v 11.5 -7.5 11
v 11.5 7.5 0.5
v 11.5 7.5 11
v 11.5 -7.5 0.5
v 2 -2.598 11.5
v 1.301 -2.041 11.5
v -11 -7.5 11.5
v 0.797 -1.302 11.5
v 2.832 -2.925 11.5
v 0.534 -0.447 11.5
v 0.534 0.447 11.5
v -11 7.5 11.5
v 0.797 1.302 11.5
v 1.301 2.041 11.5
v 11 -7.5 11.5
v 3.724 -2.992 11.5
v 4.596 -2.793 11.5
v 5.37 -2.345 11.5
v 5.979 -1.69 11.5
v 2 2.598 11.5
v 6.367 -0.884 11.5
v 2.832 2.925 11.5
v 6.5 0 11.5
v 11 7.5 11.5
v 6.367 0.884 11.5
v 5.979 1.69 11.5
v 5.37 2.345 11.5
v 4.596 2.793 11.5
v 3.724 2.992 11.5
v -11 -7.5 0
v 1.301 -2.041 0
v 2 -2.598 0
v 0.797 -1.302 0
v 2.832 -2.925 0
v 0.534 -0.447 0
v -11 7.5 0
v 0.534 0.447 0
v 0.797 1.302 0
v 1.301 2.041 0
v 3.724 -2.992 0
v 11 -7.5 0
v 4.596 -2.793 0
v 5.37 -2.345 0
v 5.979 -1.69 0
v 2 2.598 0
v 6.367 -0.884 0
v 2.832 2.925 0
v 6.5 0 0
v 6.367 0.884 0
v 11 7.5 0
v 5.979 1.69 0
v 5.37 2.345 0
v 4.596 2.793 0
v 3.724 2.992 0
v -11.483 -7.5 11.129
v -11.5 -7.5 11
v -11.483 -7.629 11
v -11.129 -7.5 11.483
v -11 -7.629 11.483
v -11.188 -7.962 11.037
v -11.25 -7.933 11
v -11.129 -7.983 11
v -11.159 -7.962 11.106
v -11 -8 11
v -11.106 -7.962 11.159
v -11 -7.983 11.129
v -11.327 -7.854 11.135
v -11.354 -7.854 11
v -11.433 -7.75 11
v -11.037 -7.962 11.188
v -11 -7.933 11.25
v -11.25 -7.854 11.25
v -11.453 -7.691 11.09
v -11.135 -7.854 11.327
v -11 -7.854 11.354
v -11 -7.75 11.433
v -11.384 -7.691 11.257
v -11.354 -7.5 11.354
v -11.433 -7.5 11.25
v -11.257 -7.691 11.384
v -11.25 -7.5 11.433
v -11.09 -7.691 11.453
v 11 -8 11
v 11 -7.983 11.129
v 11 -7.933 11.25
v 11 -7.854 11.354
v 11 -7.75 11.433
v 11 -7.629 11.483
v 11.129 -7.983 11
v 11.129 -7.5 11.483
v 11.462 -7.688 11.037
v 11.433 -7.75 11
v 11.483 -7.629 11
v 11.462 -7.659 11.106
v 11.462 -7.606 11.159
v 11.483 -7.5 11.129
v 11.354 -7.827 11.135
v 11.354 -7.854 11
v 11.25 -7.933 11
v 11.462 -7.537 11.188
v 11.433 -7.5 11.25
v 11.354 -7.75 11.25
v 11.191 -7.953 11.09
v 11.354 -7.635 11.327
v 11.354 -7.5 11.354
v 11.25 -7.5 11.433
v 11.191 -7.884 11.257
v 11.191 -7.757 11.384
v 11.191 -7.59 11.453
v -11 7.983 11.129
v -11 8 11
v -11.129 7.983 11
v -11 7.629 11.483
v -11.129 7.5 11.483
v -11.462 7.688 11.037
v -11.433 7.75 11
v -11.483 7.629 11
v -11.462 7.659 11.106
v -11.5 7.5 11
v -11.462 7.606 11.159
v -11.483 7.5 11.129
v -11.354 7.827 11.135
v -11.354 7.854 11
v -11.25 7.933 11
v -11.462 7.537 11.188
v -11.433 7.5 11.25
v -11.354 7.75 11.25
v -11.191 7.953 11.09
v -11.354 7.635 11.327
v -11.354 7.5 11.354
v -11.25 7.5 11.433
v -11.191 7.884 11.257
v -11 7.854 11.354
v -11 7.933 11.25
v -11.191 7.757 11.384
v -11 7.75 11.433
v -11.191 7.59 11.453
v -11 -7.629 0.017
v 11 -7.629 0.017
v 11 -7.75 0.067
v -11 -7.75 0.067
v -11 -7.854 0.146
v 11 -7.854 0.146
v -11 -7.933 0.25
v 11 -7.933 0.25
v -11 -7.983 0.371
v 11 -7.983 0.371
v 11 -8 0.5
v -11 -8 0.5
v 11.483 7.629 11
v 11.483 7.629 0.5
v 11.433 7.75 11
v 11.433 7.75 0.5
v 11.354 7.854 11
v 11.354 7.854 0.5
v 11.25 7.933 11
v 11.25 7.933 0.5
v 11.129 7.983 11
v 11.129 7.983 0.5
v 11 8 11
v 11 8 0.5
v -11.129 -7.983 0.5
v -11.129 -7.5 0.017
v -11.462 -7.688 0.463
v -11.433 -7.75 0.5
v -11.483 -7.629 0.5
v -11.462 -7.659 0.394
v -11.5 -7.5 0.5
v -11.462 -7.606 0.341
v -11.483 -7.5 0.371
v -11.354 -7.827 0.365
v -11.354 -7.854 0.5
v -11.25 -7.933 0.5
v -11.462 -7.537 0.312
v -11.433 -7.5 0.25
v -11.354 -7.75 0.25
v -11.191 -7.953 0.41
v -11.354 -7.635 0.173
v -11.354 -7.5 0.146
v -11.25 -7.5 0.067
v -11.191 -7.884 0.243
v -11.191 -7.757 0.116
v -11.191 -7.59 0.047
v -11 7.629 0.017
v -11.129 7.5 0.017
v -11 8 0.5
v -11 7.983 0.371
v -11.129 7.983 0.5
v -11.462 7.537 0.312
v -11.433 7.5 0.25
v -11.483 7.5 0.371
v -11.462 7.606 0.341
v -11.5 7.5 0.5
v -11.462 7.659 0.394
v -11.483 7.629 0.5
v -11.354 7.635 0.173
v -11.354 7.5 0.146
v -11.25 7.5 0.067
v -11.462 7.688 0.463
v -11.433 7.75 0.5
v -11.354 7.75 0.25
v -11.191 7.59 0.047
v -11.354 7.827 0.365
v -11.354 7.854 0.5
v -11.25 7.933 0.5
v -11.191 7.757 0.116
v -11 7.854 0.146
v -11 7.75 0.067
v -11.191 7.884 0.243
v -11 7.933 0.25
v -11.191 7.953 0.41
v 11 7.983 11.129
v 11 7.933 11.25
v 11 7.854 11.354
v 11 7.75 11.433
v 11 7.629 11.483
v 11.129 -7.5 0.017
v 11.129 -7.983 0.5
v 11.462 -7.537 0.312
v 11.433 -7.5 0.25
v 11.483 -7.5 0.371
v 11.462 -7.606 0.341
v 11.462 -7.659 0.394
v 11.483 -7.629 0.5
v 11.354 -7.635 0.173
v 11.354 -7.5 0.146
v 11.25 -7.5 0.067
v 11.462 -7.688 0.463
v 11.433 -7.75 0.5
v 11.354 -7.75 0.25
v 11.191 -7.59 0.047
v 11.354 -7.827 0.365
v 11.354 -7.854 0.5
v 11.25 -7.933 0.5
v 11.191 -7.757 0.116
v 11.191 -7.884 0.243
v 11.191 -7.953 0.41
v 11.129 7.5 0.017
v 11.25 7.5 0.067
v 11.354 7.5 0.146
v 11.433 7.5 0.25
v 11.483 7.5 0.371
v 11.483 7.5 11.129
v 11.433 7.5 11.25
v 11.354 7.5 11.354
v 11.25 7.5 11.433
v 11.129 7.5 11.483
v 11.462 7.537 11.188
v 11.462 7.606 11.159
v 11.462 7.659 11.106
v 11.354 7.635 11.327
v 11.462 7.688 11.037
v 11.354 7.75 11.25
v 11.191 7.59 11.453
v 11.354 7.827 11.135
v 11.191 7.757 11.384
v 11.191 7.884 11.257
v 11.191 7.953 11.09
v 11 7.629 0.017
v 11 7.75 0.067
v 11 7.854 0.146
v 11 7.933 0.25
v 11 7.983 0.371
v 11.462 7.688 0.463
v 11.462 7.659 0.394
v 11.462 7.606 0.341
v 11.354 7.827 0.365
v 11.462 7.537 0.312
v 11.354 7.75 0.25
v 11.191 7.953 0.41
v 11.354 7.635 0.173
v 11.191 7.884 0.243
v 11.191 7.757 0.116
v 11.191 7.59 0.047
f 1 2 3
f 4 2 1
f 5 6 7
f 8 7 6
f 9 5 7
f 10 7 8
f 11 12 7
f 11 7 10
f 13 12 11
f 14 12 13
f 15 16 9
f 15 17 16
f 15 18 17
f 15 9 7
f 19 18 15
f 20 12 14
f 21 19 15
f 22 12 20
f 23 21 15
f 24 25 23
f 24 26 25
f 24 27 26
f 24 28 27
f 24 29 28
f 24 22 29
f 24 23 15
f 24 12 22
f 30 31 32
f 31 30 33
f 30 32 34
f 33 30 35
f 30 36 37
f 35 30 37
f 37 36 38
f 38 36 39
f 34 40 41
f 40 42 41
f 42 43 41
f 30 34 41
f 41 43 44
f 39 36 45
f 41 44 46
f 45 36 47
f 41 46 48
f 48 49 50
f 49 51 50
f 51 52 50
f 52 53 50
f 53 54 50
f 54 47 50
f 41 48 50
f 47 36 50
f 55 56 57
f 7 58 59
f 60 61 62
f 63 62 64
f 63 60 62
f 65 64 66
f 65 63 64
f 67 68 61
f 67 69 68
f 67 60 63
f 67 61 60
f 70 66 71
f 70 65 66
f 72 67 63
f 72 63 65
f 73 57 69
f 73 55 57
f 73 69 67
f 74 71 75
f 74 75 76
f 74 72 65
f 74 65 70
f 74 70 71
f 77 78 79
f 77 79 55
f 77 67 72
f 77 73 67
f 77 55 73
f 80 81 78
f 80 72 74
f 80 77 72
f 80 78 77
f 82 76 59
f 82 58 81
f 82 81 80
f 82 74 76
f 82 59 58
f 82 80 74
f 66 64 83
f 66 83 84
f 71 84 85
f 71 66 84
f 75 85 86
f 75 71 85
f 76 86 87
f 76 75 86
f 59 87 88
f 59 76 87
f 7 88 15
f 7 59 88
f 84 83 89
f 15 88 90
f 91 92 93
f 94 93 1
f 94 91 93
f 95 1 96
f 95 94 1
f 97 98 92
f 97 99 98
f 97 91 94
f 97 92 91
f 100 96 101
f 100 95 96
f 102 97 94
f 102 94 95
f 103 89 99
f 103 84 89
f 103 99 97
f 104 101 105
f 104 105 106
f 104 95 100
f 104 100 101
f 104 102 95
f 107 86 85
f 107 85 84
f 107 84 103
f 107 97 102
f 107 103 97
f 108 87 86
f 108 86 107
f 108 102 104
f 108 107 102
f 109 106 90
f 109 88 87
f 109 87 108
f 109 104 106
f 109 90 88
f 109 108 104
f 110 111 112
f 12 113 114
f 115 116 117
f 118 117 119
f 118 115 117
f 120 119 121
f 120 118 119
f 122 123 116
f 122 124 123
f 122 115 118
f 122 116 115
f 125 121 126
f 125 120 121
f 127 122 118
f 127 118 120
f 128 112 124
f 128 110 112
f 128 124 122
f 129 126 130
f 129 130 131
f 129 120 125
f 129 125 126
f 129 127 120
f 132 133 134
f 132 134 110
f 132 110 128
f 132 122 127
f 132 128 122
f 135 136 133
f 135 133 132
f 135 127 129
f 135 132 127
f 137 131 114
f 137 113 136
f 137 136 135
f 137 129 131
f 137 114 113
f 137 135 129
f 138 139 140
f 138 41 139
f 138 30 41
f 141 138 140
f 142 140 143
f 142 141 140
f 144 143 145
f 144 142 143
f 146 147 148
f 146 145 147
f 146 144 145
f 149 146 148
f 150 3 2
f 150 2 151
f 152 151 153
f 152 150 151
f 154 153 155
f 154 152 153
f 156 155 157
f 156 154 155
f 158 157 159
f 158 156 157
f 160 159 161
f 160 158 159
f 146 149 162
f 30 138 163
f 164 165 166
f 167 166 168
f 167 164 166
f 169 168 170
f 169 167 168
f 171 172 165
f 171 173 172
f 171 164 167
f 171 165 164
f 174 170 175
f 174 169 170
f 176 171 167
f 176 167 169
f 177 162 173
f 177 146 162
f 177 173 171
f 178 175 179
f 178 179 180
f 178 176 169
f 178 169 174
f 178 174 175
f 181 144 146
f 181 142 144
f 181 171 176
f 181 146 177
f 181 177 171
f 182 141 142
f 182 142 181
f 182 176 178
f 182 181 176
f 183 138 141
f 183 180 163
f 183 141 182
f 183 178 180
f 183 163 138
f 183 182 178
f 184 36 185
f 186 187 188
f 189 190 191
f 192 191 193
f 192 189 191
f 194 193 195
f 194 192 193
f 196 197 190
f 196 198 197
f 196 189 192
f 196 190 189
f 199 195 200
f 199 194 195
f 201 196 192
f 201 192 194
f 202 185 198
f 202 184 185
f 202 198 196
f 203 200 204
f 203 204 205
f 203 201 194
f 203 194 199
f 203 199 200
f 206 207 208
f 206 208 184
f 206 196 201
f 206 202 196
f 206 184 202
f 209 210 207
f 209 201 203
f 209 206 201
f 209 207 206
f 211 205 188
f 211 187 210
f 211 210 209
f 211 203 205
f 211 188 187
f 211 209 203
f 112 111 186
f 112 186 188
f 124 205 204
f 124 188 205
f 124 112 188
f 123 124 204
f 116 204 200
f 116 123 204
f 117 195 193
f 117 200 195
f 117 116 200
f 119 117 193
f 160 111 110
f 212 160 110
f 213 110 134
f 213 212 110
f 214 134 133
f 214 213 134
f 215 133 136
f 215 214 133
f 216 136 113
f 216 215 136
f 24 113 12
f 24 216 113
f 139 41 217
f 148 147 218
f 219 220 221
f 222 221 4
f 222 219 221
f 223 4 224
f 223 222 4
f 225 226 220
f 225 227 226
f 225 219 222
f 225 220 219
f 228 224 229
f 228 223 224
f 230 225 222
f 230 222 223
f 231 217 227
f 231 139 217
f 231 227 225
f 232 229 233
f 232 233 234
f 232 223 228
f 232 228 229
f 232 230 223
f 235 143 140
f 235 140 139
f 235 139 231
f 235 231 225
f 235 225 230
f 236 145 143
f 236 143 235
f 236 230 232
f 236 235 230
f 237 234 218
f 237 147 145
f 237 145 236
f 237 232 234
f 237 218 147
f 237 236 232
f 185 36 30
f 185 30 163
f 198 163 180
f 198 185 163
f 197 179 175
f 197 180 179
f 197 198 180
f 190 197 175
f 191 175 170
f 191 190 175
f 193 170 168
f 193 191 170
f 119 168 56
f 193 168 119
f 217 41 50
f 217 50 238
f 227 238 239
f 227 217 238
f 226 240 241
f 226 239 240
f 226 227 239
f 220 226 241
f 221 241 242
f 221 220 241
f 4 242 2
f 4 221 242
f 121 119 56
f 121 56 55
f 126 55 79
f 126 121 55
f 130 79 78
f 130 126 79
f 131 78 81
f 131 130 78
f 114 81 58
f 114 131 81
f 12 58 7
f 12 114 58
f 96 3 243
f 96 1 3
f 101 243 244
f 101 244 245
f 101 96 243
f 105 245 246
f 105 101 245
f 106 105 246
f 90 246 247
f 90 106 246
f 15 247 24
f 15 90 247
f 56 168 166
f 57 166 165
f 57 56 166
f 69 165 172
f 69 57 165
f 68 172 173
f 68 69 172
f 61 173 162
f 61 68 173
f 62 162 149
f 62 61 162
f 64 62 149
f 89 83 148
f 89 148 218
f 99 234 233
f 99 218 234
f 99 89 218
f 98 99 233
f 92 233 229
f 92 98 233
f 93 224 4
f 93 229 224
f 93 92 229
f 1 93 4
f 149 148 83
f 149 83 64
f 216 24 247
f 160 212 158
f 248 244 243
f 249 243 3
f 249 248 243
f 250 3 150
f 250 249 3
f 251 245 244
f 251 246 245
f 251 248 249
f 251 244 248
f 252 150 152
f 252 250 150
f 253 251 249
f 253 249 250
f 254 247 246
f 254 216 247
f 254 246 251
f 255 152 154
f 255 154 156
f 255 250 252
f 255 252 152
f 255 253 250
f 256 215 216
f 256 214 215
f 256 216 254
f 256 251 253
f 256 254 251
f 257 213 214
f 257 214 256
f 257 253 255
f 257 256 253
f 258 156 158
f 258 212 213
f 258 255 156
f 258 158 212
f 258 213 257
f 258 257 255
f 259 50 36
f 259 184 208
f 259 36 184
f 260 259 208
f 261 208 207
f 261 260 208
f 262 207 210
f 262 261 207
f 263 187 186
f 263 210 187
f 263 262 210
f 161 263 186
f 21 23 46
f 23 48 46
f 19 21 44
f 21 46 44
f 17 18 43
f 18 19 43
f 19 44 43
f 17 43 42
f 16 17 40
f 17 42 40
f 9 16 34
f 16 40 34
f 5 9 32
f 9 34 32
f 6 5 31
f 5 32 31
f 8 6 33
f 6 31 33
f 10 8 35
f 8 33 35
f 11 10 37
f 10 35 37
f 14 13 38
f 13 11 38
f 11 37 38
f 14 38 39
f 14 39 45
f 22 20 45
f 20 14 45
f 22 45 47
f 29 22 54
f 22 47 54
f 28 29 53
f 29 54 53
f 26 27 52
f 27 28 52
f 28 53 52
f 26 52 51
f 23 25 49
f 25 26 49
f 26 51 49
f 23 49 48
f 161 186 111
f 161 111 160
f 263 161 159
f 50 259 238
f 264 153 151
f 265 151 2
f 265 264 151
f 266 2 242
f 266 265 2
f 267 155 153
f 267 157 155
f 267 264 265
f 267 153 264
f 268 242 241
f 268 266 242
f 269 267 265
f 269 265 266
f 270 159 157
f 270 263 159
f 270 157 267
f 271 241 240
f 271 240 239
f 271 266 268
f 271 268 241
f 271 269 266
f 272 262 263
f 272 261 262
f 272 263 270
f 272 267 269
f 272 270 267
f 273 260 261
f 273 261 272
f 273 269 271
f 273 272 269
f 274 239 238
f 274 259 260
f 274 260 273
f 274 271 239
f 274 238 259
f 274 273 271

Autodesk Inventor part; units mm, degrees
ref_plane "YZ Plane" through (0, 0, 0) normal (1, 0, 0) x (0, 1, 0)
ref_plane "XZ Plane" through (0, 0, 0) normal (0, 1, 0) x (-1, 0, 0)
ref_plane "XY Plane" through (0, 0, 0) normal (0, 0, 1) x (1, 0, 0)
sketch "Sketch1" plane through (0, 0, 0) normal (0, 0, 1) x (1, 0, 0)
  line L0 (-11.5, 8) -> (11.5, 8)
  line L1 (11.5, 8) -> (11.5, -8)
  line L2 (11.5, -8) -> (-11.5, -8)
  line L3 (-11.5, -8) -> (-11.5, 8)
  circle A0 centre (3.5, 0) radius 3
  point P0 (0, 0)
  point P1 (0, 8)
  point P2 (-11.5, 0)
  dimension "d0" = 23
  dimension "d2" = 16
  dimension "d3" = 6
  dimension "d4" = 8
extrude "Extrusion1" add sketch "Sketch1" along normal blind 11.5
fillet "Fillet1" radius 0.5 12 edges at (0, 8, 11.5) (-11.5, 0, 11.5) (0, -8, 11.5) (11.5, 0, 11.5) (0, 8, 0) (-11.5, 8, 5.75) (11.5, 8, 5.75) (0, -8, 0) (11.5, -8, 5.75) (-11.5, -8, 5.75) (11.5, 0, 0) (-11.5, 0, 0)
properties part number "heat block"
